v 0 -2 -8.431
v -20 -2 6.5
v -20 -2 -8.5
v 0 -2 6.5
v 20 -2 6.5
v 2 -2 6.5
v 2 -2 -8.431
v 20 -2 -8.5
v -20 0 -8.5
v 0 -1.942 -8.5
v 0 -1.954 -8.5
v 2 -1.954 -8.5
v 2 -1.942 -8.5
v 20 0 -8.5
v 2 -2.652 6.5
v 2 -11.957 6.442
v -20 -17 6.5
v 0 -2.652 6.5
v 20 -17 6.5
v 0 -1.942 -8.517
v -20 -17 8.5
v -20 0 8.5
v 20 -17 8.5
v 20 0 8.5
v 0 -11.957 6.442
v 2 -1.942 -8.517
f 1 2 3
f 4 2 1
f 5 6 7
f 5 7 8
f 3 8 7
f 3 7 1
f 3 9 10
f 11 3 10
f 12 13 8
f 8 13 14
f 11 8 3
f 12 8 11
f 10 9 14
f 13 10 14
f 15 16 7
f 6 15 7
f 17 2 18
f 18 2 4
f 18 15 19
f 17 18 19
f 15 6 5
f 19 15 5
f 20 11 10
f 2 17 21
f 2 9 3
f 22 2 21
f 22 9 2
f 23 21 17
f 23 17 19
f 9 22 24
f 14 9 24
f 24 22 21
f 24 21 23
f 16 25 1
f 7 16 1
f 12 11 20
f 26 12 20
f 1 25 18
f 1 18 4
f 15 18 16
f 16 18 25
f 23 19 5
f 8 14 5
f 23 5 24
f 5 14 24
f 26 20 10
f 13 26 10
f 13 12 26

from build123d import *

# Parameters (mm, degrees)
F0_W     = 40
F0_H     = 17
F1_DEPTH = 2
F2_W     = 40
F2_H     = 2
F3_DEPTH = 15
F5_DEPTH = 2


with BuildPart() as f1:
    # F0 (on Front) → F1 (new body)
    with BuildSketch(Plane.XZ):
        Rectangle(F0_W, F0_H)
    extrude(amount=F1_DEPTH)

    # F2 (on face) → F3 (join)
    with BuildSketch(Plane.XZ.offset(2)):
        with Locations((0, 7.5)):
            Rectangle(F2_W, F2_H)
    extrude(amount=F3_DEPTH)

    # F4 (on Right) → F5 (join)
    with BuildSketch(Plane.YZ):
        Polygon((-1.942217, 6.504434), (-11.956673, 6.441844), (-1.942217, -8.517251), align=None)
    extrude(amount=F5_DEPTH)


solid = f1.part
